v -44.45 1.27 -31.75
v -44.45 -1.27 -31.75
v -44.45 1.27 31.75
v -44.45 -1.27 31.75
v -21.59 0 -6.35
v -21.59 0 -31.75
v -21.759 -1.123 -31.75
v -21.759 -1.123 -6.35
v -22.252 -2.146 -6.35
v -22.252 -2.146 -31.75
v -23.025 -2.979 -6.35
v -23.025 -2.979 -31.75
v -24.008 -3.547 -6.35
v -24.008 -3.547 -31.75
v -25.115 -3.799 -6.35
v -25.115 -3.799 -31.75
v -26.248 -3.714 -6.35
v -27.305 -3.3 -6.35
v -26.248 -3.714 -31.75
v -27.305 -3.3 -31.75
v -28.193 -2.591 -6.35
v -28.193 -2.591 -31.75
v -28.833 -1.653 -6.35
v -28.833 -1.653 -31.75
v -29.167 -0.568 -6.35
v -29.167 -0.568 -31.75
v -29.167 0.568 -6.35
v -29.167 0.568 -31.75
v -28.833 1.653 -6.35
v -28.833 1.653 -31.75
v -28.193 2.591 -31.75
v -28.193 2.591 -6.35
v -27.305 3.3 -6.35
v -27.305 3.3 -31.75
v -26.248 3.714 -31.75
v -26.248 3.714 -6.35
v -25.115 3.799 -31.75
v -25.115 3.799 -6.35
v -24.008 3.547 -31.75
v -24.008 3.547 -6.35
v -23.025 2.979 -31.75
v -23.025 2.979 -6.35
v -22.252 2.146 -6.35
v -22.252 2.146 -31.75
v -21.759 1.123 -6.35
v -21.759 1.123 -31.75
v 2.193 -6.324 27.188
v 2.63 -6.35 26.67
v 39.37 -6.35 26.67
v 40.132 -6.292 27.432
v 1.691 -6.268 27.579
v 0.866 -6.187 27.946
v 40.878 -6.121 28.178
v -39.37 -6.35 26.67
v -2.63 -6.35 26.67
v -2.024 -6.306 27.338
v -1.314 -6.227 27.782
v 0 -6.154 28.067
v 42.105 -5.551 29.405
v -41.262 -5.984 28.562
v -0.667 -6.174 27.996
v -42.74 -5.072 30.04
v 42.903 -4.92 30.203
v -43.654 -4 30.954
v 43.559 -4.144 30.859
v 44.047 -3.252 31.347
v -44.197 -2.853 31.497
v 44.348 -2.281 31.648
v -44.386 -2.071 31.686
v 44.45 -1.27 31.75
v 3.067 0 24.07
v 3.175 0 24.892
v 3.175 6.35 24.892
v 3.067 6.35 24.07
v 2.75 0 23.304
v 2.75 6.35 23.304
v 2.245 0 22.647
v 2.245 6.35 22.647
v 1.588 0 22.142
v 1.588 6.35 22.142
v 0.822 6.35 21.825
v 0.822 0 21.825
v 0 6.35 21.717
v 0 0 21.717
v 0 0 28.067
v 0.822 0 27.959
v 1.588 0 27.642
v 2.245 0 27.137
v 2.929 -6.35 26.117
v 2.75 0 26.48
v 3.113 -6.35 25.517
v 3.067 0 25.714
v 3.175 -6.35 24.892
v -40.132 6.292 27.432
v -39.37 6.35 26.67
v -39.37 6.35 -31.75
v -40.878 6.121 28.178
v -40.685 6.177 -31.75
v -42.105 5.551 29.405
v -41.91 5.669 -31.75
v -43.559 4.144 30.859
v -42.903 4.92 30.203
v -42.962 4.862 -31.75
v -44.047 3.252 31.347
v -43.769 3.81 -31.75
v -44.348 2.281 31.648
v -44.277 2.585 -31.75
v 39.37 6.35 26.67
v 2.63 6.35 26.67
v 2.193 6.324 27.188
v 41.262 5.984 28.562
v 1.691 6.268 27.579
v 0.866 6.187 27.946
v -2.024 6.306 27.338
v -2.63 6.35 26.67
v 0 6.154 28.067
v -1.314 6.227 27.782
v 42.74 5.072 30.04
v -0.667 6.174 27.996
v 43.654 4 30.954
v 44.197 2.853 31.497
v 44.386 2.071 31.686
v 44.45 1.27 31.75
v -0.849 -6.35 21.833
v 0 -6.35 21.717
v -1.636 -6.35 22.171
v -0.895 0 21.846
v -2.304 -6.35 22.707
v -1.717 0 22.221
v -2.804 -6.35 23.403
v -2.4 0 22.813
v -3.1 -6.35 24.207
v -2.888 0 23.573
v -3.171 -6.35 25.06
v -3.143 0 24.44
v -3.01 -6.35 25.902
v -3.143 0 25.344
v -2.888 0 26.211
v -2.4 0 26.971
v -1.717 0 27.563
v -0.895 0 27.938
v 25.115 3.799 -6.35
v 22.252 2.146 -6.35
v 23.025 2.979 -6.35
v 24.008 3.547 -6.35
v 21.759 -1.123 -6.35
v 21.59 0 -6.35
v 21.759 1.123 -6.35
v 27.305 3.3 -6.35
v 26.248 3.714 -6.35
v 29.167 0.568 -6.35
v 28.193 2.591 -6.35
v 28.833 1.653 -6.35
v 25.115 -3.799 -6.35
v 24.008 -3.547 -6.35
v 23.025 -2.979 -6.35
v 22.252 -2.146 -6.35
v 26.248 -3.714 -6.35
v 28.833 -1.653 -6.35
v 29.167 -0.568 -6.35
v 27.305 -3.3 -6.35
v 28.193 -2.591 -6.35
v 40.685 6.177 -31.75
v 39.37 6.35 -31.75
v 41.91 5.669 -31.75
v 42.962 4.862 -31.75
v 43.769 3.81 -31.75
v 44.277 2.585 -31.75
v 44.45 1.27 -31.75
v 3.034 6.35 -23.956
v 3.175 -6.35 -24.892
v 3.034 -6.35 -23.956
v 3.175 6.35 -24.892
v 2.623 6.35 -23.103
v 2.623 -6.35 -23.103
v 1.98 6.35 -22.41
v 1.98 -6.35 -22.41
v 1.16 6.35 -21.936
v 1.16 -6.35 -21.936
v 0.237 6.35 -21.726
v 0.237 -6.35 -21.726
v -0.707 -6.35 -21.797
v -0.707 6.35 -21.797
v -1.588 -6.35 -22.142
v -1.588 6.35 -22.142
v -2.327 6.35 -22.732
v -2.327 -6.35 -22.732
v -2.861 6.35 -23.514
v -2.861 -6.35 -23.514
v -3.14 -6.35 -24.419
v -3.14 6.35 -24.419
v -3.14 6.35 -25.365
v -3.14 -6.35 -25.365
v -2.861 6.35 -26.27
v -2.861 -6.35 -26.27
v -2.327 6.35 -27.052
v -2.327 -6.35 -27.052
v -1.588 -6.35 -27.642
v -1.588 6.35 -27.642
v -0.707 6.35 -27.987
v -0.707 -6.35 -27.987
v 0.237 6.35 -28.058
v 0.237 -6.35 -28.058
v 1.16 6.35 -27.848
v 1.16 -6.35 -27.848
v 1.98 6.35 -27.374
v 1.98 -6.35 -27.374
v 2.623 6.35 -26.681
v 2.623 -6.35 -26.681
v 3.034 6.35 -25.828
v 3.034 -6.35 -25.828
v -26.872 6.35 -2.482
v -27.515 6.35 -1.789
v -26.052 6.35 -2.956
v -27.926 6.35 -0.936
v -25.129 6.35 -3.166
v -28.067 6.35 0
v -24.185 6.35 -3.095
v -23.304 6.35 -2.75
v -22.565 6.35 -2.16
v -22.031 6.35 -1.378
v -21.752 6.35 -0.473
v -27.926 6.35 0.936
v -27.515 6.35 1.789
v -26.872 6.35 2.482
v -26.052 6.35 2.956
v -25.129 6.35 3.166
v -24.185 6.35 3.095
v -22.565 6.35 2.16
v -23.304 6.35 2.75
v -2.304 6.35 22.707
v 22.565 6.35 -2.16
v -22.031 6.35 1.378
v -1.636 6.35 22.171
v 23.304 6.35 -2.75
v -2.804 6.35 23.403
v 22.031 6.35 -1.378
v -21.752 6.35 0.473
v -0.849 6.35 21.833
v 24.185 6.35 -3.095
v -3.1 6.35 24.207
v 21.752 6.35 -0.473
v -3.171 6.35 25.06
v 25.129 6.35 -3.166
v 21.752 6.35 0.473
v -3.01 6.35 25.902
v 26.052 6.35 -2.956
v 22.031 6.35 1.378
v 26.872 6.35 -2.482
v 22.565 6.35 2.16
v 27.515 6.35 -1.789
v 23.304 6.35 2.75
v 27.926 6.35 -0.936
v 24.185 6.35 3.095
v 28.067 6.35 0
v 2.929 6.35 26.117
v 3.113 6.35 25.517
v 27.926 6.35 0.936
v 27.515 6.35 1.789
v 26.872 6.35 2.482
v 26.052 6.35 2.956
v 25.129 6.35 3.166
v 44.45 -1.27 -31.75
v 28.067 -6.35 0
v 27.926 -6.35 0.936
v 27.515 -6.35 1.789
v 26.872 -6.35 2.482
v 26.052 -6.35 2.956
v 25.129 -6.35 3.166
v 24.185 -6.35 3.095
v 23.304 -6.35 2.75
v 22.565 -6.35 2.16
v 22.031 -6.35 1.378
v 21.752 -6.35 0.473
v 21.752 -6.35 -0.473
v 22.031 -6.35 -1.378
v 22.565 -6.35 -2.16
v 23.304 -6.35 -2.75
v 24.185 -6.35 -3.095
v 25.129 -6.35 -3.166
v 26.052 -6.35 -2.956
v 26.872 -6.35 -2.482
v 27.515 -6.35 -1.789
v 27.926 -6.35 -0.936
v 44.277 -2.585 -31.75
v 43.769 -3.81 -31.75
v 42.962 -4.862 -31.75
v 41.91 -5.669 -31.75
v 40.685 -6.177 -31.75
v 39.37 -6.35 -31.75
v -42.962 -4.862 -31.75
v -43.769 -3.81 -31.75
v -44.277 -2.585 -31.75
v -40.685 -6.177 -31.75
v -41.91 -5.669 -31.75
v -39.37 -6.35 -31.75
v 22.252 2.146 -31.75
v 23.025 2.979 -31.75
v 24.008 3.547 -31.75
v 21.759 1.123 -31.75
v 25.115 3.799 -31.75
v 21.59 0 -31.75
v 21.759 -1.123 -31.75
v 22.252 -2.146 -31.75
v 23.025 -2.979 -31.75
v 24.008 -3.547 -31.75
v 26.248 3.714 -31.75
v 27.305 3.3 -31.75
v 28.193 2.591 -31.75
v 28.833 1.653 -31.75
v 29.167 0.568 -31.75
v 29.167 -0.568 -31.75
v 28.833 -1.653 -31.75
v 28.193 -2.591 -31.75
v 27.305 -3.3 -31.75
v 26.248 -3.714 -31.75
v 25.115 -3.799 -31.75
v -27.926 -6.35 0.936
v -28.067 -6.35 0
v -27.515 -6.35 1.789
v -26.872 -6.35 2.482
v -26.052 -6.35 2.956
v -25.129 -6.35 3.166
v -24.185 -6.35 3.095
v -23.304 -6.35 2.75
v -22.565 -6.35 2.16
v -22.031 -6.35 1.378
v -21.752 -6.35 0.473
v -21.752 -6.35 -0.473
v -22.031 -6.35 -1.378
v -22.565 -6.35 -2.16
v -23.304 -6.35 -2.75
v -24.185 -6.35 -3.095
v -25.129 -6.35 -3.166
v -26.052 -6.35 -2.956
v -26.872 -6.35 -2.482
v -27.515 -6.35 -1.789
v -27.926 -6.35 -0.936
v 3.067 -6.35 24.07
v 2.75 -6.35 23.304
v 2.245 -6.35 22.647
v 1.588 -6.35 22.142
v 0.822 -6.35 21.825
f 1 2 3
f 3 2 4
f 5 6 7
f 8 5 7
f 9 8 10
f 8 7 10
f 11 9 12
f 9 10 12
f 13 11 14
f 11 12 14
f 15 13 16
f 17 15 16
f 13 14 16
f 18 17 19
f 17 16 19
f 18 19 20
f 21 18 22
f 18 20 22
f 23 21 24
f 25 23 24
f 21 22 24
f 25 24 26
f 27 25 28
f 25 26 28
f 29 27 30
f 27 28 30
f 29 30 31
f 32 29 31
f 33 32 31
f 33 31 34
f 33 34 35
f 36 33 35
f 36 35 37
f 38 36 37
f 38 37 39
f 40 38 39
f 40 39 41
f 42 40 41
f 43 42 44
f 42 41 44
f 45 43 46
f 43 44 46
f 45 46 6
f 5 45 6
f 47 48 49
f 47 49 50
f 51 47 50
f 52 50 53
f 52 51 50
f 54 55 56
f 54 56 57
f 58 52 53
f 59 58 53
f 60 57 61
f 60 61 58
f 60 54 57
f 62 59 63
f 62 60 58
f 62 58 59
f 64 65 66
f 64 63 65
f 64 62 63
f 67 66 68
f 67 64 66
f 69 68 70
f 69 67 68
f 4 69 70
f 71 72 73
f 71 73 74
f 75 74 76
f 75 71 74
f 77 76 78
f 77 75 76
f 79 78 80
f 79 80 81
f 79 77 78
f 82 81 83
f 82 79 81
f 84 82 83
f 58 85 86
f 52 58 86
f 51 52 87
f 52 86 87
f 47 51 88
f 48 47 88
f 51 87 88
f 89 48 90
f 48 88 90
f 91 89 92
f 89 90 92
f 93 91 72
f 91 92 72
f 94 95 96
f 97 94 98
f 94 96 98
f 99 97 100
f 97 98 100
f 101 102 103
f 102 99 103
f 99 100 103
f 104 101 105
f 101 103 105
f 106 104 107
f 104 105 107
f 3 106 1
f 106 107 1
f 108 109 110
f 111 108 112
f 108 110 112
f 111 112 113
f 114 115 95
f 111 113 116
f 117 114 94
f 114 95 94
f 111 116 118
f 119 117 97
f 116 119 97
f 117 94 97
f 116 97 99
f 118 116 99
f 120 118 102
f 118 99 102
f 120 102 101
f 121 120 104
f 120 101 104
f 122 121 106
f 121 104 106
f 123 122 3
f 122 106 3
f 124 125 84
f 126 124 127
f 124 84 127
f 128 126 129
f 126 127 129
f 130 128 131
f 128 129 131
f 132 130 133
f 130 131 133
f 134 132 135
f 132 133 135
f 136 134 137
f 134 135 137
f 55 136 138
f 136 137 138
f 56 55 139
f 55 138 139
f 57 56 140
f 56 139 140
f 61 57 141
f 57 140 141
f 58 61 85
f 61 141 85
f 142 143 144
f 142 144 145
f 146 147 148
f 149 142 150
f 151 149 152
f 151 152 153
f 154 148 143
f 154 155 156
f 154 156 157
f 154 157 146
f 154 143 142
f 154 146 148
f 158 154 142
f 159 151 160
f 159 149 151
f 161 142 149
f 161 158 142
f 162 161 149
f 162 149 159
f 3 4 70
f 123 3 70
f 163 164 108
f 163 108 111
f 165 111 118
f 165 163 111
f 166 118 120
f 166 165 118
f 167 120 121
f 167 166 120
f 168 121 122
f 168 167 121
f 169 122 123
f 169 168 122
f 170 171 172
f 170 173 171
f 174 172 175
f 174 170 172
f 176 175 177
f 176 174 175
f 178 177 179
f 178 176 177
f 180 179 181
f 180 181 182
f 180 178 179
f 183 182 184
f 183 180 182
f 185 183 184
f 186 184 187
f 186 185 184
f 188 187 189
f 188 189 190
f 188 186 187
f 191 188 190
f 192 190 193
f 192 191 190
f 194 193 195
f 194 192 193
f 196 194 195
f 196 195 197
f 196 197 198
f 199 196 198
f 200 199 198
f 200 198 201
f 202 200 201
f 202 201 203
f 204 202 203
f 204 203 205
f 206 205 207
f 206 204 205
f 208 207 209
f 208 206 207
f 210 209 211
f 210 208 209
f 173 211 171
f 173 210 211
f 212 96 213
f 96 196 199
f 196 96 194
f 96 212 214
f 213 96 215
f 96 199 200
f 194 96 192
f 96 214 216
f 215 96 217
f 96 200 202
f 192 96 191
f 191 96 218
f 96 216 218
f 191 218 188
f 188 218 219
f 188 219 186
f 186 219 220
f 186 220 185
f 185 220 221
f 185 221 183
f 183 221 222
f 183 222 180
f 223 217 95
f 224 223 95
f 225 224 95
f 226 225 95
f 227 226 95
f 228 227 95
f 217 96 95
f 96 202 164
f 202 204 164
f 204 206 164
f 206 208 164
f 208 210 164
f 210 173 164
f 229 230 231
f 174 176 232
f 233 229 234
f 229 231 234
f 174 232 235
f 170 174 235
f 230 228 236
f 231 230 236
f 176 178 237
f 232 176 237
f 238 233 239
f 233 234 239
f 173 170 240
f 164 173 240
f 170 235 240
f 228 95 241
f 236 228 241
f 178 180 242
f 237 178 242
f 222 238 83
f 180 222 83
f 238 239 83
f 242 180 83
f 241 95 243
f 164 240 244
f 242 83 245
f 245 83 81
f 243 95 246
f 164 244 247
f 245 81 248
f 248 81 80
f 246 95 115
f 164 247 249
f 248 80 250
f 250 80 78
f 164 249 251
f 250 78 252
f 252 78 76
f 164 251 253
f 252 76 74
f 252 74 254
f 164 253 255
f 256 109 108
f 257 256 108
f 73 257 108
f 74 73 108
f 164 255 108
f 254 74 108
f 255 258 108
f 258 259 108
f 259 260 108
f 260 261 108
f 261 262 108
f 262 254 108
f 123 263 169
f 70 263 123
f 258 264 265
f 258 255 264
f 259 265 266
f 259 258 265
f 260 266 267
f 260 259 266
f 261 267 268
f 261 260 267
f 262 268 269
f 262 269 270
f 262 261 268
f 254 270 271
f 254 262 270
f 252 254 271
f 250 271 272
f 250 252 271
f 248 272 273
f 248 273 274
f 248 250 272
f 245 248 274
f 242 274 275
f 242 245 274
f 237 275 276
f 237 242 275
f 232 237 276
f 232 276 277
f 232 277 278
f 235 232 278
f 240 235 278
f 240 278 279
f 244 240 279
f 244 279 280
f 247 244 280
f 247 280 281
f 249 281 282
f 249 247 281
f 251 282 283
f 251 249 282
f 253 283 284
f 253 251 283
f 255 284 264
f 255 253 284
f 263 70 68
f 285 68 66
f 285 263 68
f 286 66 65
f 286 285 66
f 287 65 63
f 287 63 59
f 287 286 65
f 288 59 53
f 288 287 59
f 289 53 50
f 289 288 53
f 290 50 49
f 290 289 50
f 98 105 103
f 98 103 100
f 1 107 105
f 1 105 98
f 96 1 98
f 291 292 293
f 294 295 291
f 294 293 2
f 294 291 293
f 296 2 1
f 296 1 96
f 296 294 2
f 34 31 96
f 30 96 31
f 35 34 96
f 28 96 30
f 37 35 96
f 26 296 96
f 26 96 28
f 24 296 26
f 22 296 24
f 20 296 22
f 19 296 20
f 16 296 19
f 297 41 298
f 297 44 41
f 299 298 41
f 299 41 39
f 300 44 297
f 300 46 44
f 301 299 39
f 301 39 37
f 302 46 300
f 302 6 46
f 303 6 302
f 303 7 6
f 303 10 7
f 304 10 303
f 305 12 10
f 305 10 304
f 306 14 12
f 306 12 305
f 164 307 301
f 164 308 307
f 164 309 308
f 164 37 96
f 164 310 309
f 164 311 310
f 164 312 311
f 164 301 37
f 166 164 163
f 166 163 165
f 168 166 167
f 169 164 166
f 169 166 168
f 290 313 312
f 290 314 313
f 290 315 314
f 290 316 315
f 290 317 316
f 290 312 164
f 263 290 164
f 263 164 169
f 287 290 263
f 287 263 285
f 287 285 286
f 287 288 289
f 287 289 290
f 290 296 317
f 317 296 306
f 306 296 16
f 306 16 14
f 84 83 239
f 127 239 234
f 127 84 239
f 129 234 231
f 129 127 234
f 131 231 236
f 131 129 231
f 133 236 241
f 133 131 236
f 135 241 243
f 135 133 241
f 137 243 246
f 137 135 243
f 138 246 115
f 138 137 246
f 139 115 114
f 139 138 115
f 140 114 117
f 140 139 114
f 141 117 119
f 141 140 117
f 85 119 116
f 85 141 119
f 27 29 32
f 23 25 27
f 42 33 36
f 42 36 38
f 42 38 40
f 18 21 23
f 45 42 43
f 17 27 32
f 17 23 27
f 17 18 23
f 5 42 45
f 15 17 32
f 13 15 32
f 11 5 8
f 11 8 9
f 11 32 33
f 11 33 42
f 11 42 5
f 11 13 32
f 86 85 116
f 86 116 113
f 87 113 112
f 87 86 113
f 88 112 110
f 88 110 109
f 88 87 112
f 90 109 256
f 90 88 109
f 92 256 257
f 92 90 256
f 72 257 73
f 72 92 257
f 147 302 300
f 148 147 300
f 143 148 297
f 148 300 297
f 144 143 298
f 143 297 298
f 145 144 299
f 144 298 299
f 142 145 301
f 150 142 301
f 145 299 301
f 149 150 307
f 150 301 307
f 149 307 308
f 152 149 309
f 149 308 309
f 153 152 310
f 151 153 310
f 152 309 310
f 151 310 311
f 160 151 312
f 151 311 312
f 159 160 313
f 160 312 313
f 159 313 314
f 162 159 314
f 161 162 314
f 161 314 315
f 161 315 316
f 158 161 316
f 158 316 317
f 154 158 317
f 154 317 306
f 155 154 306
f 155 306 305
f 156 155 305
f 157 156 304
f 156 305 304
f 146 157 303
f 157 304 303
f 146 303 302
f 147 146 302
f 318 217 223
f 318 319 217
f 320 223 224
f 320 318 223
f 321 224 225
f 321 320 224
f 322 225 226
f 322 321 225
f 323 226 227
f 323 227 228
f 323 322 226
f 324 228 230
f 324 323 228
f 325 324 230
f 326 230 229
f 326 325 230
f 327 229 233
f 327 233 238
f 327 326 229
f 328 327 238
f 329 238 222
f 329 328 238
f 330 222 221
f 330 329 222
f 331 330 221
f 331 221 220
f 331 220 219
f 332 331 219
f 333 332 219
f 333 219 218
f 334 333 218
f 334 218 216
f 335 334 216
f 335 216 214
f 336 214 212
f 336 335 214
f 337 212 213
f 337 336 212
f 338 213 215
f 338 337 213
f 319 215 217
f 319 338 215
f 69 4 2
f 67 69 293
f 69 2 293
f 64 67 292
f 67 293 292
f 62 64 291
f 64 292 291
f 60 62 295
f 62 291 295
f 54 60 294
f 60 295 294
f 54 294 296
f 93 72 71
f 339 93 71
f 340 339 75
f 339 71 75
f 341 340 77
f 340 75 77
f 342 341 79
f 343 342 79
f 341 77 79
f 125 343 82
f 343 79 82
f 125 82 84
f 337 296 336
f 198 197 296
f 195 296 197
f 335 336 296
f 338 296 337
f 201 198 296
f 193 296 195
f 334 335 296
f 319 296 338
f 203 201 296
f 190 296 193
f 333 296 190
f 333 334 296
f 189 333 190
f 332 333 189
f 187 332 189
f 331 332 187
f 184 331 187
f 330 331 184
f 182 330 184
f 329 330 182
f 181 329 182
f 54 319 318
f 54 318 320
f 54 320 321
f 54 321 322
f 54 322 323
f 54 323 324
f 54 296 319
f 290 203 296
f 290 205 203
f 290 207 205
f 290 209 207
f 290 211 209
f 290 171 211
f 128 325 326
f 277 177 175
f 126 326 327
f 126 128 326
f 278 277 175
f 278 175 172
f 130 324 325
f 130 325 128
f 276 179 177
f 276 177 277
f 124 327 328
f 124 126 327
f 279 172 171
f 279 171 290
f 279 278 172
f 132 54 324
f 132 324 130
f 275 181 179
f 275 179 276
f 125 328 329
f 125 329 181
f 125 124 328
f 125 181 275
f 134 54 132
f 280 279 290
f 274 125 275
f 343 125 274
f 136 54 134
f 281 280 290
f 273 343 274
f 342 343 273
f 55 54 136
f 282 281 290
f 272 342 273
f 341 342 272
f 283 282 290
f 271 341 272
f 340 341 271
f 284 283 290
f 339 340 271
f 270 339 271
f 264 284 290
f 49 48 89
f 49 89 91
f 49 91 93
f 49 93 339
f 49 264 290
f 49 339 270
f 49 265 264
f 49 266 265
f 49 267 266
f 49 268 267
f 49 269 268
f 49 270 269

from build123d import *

# Parameters (mm, degrees)
F0_W        = 88.9
F0_H        = 63.5
F0_R        = 3.175
F1_DEPTH    = 6.35
F2_R        = 3.81
F3_DEPTH    = 25.4
F4_T1_DEPTH = 88.9
F4_T3_DEPTH = 114.3


# Not quite as in the source:
# - a fillet or chamfer that OpenCascade refuses, or shapes differently, is made with other operations: its cross-section is extruded or revolved along the edge and cut away or added


with BuildPart() as f1:
    # F0 (on Front) → F1 (new body, symmetric)
    with BuildSketch(Plane.XZ):
        Rectangle(F0_W, F0_H)
        with Locations((0, -24.892)):
            Circle(F0_R, mode=Mode.SUBTRACT)
        with BuildLine():
            ThreePointArc((-21.717, 0), (-24.892, -3.175), (-28.067, 0))
            ThreePointArc((-28.067, 0), (-24.892, 3.175), (-21.717, 0))
        make_face(mode=Mode.SUBTRACT)
        with Locations((24.892, 0)):
            Circle(F0_R, mode=Mode.SUBTRACT)
        with BuildLine():
            ThreePointArc((0, 21.717), (-3.175, 24.892), (0, 28.067))
            ThreePointArc((0, 28.067), (2.2450640303, 27.1370640303), (3.175, 24.892))
            ThreePointArc((3.175, 24.892), (2.2450640303, 22.6469359697), (0, 21.717))
        make_face(mode=Mode.SUBTRACT)
    extrude(amount=F1_DEPTH, both=True)

    # F2 (on face) → F3 (cut)
    with BuildSketch(Plane(origin=(0, 0, -31.75), x_dir=(1, 0, 0), z_dir=(0, 0, -1))):
        with Locations((-25.4, 0)):
            Circle(F2_R)
        with BuildLine():
            ThreePointArc((29.21, 0), (25.4, 3.81), (21.59, 0))
            ThreePointArc((21.59, 0), (25.4, -3.81), (29.21, 0))
        make_face()
    extrude(amount=-F3_DEPTH, mode=Mode.SUBTRACT)

    # F4: fillet of radius 5.08 on 6 edges, made by hand

    # F4_s2 → F4_t1 (cut)
    with BuildSketch(Plane.XY.offset(-44.45)):
        with BuildLine():
            ThreePointArc((-44.45, -1.27), (-42.9621024484, -4.8621024484), (-39.37, -6.35))
            Line((-39.37, -6.35), (-44.45, -6.35))
            Line((-44.45, -6.35), (-44.45, -1.27))
        make_face()
        with BuildLine():
            ThreePointArc((44.45, -1.27), (42.9621024484, -4.8621024484), (39.37, -6.35))
            Line((39.37, -6.35), (44.45, -6.35))
            Line((44.45, -6.35), (44.45, -1.27))
        make_face()
        with BuildLine():
            ThreePointArc((39.37, 6.35), (42.9621024484, 4.8621024484), (44.45, 1.27))
            Line((44.45, 1.27), (44.45, 6.35))
            Line((44.45, 6.35), (39.37, 6.35))
        make_face()
        with BuildLine():
            ThreePointArc((-39.37, 6.35), (-42.9621024484, 4.8621024484), (-44.45, 1.27))
            Line((-44.45, 1.27), (-44.45, 6.35))
            Line((-44.45, 6.35), (-39.37, 6.35))
        make_face()
    extrude(amount=F4_T1_DEPTH, mode=Mode.SUBTRACT)

    # F4_s4 → F4_t3 (cut)
    with BuildSketch(Plane.YZ.offset(-57.15)):
        with BuildLine():
            ThreePointArc((-6.35, 26.67), (-4.8621024484, 30.2621024484), (-1.27, 31.75))
            Line((-1.27, 31.75), (-6.35, 31.75))
            Line((-6.35, 31.75), (-6.35, 26.67))
        make_face()
        with BuildLine():
            ThreePointArc((6.35, 26.67), (4.8621024484, 30.2621024484), (1.27, 31.75))
            Line((1.27, 31.75), (6.35, 31.75))
            Line((6.35, 31.75), (6.35, 26.67))
        make_face()
    extrude(amount=F4_T3_DEPTH, mode=Mode.SUBTRACT)


solid = f1.part
